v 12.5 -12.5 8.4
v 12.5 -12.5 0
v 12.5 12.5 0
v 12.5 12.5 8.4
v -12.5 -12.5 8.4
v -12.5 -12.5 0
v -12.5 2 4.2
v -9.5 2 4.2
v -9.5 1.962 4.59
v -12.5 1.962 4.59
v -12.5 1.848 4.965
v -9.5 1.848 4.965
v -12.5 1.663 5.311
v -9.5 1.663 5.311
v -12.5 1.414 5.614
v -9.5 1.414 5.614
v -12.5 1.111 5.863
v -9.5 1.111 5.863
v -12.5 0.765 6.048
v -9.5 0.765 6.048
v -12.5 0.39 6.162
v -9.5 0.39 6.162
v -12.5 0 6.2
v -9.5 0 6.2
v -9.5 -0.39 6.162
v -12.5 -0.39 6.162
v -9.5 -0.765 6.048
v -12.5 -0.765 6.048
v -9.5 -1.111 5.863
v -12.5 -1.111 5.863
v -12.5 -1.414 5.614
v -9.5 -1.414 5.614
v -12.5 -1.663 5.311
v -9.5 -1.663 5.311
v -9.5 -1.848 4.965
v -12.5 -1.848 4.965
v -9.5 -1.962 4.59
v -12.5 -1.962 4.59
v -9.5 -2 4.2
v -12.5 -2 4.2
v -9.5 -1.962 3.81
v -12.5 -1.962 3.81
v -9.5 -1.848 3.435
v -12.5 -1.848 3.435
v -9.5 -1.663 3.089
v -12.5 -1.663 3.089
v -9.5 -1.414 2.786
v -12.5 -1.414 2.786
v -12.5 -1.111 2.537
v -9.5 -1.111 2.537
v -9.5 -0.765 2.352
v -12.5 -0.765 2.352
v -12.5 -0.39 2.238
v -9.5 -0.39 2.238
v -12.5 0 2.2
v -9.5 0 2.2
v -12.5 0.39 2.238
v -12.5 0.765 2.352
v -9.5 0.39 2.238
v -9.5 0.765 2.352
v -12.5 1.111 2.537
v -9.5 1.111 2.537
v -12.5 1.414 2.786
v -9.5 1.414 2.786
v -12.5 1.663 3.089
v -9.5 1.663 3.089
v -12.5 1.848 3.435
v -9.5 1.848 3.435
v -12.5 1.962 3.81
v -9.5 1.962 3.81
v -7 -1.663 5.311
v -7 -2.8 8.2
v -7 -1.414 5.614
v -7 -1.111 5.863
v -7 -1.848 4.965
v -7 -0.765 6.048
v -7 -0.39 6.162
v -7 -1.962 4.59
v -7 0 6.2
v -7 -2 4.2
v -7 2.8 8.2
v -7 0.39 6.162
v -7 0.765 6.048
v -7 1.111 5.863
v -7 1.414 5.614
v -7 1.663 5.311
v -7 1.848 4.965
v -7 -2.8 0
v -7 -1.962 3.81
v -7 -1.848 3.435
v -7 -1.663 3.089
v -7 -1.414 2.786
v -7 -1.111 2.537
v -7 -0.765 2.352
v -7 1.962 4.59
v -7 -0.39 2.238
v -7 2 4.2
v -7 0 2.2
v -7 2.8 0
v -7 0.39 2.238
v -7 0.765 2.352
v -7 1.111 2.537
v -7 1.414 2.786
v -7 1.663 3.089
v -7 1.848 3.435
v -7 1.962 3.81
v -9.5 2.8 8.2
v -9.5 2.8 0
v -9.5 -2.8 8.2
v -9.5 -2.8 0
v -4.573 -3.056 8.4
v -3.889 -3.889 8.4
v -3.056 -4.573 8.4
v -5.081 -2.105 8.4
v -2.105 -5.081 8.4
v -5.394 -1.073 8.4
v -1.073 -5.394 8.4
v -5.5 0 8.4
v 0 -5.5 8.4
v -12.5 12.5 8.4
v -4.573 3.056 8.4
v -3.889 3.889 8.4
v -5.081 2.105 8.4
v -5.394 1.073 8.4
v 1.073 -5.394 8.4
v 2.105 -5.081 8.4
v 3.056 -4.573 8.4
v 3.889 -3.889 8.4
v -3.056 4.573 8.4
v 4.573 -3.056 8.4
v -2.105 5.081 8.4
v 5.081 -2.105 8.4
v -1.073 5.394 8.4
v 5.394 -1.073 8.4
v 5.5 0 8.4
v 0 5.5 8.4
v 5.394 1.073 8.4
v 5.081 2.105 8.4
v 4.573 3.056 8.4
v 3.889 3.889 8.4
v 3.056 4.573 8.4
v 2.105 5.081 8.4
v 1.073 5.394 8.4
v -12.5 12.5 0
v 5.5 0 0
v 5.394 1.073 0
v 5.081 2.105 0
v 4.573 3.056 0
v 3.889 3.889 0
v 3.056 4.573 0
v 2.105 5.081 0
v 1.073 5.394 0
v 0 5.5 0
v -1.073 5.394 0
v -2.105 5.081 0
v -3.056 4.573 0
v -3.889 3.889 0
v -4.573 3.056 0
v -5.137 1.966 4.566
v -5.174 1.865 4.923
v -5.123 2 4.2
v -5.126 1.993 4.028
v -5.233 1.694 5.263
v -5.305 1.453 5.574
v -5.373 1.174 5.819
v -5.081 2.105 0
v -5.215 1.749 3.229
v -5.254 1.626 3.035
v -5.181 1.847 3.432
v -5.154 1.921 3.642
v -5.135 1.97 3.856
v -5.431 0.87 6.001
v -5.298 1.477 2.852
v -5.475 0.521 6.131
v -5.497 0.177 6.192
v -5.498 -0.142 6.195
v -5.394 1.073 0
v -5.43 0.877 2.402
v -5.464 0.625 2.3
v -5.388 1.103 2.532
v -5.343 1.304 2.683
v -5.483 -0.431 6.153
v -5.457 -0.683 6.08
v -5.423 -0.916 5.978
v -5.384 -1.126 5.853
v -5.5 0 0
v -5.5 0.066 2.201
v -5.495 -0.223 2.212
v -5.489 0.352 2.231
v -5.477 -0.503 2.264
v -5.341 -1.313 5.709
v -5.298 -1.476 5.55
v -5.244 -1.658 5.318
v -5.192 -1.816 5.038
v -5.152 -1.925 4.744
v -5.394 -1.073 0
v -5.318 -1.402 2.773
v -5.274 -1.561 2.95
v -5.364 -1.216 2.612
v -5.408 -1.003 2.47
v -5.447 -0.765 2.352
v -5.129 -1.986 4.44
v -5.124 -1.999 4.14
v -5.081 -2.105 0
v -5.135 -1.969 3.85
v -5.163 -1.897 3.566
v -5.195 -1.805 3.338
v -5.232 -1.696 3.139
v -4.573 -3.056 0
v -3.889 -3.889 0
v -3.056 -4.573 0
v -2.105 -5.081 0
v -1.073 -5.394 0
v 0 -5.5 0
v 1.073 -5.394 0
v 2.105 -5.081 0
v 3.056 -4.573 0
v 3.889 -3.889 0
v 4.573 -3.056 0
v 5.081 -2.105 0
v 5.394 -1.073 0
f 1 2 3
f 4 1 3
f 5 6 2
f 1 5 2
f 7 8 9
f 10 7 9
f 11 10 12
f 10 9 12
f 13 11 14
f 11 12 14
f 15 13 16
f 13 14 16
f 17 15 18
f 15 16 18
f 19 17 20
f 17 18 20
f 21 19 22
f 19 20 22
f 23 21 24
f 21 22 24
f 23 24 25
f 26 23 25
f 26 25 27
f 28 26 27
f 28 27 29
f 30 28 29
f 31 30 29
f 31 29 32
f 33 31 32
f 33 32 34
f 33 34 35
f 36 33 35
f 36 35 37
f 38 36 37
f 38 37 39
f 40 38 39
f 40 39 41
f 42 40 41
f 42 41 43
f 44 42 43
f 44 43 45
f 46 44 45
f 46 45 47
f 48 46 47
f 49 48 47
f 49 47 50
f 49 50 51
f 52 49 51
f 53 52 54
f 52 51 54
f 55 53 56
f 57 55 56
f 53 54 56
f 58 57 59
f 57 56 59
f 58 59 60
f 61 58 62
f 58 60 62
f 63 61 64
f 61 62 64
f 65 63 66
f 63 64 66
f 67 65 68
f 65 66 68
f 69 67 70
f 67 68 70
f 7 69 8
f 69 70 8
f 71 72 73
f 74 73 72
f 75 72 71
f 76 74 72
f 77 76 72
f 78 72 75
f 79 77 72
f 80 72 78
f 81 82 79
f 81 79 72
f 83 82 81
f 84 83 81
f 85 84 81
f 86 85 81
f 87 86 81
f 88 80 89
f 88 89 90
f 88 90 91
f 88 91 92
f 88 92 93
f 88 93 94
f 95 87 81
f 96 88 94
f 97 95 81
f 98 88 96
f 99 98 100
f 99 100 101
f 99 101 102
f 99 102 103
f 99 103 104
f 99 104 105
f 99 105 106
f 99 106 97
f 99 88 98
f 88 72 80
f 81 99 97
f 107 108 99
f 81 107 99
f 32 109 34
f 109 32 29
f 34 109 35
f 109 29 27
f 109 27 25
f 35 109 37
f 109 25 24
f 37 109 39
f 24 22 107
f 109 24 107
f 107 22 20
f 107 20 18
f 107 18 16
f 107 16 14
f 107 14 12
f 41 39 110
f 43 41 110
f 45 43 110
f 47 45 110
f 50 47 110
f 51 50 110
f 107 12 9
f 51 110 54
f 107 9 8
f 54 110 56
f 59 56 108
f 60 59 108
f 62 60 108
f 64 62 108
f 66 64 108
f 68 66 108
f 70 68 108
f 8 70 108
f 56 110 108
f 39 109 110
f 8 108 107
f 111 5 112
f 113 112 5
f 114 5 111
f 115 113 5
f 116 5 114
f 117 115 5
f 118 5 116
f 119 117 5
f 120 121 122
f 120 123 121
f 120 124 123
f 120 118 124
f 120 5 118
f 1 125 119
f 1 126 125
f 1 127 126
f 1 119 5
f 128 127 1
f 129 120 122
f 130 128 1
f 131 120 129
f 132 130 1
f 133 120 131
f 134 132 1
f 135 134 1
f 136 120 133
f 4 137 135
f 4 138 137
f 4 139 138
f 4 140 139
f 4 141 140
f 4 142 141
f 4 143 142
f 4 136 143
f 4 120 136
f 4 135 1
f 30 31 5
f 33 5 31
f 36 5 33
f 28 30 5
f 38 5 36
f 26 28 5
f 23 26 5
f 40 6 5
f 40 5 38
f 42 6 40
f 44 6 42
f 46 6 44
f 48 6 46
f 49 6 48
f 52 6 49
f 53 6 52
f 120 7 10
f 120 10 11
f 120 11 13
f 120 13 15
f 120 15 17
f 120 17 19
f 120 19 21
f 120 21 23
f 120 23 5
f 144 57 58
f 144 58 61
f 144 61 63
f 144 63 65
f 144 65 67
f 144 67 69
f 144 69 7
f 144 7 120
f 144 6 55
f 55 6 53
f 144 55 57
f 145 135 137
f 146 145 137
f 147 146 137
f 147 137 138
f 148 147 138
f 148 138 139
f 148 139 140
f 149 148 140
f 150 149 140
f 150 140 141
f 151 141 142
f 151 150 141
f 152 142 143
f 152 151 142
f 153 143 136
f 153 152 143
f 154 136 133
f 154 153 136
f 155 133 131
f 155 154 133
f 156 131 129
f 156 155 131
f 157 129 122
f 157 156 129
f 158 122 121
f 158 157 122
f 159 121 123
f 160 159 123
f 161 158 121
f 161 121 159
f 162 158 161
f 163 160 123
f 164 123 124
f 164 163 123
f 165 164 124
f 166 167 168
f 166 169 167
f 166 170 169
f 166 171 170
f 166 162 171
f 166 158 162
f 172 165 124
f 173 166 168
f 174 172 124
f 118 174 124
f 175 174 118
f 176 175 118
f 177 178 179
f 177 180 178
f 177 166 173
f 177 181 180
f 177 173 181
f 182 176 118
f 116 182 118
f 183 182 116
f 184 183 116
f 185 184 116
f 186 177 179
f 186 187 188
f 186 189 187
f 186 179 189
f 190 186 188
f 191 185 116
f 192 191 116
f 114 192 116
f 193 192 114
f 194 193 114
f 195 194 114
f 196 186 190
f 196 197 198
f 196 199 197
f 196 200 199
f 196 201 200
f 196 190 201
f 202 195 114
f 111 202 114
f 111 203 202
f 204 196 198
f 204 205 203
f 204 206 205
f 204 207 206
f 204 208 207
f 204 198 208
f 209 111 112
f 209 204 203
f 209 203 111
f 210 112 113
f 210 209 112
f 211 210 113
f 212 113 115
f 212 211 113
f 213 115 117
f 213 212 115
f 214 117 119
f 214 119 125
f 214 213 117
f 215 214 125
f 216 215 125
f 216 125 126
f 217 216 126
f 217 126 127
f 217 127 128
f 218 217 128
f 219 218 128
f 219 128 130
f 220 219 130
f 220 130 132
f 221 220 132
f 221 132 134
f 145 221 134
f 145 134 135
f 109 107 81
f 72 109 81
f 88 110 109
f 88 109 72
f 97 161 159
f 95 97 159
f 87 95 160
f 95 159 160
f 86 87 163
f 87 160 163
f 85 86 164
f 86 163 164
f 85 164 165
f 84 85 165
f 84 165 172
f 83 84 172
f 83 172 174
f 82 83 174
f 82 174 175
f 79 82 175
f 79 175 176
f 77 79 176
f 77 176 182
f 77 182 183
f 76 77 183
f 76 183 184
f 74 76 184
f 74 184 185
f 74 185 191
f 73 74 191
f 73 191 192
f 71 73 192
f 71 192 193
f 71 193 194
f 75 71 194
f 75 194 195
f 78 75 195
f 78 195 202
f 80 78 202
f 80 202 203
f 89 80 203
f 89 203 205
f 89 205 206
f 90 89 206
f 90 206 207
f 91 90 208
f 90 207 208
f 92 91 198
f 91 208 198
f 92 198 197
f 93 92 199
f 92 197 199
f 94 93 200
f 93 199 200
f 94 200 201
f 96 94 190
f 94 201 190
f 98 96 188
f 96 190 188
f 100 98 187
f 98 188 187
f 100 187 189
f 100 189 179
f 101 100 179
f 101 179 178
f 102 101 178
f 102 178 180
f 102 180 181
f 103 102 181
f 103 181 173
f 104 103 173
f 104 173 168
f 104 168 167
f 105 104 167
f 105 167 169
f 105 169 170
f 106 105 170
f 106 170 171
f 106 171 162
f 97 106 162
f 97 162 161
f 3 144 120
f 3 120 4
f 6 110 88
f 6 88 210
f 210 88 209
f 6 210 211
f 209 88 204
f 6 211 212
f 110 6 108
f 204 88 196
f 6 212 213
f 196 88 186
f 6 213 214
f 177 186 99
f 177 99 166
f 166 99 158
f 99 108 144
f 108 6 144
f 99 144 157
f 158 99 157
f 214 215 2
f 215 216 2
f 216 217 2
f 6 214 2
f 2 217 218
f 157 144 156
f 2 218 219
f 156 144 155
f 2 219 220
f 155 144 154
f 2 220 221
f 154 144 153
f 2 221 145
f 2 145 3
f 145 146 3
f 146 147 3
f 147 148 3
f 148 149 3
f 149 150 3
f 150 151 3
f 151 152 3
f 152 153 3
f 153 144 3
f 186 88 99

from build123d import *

# Parameters (mm, degrees)
SKETCH002_W      = 2.5
SKETCH002_H      = 5.6
EXTRUDE002_DEPTH = 8.2
SKETCH001_R      = 2
EXTRUDE001_DEPTH = 20
SKETCH_W         = 25
SKETCH_H         = 25
SKETCH_R         = 5.5
EXTRUDE_DEPTH    = 8.4


with BuildPart() as extrude002:
    # Sketch002 → Extrude002 (new body)
    with BuildSketch(Plane.XY):
        with Locations((-8.25, 0)):
            Rectangle(SKETCH002_W, SKETCH002_H)
    extrude(amount=EXTRUDE002_DEPTH)


with BuildPart() as extrude001:
    # Sketch001 → Extrude001 (new body)
    with BuildSketch(Plane.YZ):
        with Locations((0, 4.2)):
            Circle(SKETCH001_R)
    extrude(amount=-EXTRUDE001_DEPTH)


with BuildPart() as body:
    # Sketch → Extrude (new body)
    with BuildSketch(Plane.XY):
        Rectangle(SKETCH_W, SKETCH_H)
        Circle(SKETCH_R, mode=Mode.SUBTRACT)
    extrude(amount=EXTRUDE_DEPTH)

    # Cut: cut Extrude001
    add(extrude001.part, mode=Mode.SUBTRACT)

    # Cut001: cut Extrude002
    add(extrude002.part, mode=Mode.SUBTRACT)


solid = body.part
